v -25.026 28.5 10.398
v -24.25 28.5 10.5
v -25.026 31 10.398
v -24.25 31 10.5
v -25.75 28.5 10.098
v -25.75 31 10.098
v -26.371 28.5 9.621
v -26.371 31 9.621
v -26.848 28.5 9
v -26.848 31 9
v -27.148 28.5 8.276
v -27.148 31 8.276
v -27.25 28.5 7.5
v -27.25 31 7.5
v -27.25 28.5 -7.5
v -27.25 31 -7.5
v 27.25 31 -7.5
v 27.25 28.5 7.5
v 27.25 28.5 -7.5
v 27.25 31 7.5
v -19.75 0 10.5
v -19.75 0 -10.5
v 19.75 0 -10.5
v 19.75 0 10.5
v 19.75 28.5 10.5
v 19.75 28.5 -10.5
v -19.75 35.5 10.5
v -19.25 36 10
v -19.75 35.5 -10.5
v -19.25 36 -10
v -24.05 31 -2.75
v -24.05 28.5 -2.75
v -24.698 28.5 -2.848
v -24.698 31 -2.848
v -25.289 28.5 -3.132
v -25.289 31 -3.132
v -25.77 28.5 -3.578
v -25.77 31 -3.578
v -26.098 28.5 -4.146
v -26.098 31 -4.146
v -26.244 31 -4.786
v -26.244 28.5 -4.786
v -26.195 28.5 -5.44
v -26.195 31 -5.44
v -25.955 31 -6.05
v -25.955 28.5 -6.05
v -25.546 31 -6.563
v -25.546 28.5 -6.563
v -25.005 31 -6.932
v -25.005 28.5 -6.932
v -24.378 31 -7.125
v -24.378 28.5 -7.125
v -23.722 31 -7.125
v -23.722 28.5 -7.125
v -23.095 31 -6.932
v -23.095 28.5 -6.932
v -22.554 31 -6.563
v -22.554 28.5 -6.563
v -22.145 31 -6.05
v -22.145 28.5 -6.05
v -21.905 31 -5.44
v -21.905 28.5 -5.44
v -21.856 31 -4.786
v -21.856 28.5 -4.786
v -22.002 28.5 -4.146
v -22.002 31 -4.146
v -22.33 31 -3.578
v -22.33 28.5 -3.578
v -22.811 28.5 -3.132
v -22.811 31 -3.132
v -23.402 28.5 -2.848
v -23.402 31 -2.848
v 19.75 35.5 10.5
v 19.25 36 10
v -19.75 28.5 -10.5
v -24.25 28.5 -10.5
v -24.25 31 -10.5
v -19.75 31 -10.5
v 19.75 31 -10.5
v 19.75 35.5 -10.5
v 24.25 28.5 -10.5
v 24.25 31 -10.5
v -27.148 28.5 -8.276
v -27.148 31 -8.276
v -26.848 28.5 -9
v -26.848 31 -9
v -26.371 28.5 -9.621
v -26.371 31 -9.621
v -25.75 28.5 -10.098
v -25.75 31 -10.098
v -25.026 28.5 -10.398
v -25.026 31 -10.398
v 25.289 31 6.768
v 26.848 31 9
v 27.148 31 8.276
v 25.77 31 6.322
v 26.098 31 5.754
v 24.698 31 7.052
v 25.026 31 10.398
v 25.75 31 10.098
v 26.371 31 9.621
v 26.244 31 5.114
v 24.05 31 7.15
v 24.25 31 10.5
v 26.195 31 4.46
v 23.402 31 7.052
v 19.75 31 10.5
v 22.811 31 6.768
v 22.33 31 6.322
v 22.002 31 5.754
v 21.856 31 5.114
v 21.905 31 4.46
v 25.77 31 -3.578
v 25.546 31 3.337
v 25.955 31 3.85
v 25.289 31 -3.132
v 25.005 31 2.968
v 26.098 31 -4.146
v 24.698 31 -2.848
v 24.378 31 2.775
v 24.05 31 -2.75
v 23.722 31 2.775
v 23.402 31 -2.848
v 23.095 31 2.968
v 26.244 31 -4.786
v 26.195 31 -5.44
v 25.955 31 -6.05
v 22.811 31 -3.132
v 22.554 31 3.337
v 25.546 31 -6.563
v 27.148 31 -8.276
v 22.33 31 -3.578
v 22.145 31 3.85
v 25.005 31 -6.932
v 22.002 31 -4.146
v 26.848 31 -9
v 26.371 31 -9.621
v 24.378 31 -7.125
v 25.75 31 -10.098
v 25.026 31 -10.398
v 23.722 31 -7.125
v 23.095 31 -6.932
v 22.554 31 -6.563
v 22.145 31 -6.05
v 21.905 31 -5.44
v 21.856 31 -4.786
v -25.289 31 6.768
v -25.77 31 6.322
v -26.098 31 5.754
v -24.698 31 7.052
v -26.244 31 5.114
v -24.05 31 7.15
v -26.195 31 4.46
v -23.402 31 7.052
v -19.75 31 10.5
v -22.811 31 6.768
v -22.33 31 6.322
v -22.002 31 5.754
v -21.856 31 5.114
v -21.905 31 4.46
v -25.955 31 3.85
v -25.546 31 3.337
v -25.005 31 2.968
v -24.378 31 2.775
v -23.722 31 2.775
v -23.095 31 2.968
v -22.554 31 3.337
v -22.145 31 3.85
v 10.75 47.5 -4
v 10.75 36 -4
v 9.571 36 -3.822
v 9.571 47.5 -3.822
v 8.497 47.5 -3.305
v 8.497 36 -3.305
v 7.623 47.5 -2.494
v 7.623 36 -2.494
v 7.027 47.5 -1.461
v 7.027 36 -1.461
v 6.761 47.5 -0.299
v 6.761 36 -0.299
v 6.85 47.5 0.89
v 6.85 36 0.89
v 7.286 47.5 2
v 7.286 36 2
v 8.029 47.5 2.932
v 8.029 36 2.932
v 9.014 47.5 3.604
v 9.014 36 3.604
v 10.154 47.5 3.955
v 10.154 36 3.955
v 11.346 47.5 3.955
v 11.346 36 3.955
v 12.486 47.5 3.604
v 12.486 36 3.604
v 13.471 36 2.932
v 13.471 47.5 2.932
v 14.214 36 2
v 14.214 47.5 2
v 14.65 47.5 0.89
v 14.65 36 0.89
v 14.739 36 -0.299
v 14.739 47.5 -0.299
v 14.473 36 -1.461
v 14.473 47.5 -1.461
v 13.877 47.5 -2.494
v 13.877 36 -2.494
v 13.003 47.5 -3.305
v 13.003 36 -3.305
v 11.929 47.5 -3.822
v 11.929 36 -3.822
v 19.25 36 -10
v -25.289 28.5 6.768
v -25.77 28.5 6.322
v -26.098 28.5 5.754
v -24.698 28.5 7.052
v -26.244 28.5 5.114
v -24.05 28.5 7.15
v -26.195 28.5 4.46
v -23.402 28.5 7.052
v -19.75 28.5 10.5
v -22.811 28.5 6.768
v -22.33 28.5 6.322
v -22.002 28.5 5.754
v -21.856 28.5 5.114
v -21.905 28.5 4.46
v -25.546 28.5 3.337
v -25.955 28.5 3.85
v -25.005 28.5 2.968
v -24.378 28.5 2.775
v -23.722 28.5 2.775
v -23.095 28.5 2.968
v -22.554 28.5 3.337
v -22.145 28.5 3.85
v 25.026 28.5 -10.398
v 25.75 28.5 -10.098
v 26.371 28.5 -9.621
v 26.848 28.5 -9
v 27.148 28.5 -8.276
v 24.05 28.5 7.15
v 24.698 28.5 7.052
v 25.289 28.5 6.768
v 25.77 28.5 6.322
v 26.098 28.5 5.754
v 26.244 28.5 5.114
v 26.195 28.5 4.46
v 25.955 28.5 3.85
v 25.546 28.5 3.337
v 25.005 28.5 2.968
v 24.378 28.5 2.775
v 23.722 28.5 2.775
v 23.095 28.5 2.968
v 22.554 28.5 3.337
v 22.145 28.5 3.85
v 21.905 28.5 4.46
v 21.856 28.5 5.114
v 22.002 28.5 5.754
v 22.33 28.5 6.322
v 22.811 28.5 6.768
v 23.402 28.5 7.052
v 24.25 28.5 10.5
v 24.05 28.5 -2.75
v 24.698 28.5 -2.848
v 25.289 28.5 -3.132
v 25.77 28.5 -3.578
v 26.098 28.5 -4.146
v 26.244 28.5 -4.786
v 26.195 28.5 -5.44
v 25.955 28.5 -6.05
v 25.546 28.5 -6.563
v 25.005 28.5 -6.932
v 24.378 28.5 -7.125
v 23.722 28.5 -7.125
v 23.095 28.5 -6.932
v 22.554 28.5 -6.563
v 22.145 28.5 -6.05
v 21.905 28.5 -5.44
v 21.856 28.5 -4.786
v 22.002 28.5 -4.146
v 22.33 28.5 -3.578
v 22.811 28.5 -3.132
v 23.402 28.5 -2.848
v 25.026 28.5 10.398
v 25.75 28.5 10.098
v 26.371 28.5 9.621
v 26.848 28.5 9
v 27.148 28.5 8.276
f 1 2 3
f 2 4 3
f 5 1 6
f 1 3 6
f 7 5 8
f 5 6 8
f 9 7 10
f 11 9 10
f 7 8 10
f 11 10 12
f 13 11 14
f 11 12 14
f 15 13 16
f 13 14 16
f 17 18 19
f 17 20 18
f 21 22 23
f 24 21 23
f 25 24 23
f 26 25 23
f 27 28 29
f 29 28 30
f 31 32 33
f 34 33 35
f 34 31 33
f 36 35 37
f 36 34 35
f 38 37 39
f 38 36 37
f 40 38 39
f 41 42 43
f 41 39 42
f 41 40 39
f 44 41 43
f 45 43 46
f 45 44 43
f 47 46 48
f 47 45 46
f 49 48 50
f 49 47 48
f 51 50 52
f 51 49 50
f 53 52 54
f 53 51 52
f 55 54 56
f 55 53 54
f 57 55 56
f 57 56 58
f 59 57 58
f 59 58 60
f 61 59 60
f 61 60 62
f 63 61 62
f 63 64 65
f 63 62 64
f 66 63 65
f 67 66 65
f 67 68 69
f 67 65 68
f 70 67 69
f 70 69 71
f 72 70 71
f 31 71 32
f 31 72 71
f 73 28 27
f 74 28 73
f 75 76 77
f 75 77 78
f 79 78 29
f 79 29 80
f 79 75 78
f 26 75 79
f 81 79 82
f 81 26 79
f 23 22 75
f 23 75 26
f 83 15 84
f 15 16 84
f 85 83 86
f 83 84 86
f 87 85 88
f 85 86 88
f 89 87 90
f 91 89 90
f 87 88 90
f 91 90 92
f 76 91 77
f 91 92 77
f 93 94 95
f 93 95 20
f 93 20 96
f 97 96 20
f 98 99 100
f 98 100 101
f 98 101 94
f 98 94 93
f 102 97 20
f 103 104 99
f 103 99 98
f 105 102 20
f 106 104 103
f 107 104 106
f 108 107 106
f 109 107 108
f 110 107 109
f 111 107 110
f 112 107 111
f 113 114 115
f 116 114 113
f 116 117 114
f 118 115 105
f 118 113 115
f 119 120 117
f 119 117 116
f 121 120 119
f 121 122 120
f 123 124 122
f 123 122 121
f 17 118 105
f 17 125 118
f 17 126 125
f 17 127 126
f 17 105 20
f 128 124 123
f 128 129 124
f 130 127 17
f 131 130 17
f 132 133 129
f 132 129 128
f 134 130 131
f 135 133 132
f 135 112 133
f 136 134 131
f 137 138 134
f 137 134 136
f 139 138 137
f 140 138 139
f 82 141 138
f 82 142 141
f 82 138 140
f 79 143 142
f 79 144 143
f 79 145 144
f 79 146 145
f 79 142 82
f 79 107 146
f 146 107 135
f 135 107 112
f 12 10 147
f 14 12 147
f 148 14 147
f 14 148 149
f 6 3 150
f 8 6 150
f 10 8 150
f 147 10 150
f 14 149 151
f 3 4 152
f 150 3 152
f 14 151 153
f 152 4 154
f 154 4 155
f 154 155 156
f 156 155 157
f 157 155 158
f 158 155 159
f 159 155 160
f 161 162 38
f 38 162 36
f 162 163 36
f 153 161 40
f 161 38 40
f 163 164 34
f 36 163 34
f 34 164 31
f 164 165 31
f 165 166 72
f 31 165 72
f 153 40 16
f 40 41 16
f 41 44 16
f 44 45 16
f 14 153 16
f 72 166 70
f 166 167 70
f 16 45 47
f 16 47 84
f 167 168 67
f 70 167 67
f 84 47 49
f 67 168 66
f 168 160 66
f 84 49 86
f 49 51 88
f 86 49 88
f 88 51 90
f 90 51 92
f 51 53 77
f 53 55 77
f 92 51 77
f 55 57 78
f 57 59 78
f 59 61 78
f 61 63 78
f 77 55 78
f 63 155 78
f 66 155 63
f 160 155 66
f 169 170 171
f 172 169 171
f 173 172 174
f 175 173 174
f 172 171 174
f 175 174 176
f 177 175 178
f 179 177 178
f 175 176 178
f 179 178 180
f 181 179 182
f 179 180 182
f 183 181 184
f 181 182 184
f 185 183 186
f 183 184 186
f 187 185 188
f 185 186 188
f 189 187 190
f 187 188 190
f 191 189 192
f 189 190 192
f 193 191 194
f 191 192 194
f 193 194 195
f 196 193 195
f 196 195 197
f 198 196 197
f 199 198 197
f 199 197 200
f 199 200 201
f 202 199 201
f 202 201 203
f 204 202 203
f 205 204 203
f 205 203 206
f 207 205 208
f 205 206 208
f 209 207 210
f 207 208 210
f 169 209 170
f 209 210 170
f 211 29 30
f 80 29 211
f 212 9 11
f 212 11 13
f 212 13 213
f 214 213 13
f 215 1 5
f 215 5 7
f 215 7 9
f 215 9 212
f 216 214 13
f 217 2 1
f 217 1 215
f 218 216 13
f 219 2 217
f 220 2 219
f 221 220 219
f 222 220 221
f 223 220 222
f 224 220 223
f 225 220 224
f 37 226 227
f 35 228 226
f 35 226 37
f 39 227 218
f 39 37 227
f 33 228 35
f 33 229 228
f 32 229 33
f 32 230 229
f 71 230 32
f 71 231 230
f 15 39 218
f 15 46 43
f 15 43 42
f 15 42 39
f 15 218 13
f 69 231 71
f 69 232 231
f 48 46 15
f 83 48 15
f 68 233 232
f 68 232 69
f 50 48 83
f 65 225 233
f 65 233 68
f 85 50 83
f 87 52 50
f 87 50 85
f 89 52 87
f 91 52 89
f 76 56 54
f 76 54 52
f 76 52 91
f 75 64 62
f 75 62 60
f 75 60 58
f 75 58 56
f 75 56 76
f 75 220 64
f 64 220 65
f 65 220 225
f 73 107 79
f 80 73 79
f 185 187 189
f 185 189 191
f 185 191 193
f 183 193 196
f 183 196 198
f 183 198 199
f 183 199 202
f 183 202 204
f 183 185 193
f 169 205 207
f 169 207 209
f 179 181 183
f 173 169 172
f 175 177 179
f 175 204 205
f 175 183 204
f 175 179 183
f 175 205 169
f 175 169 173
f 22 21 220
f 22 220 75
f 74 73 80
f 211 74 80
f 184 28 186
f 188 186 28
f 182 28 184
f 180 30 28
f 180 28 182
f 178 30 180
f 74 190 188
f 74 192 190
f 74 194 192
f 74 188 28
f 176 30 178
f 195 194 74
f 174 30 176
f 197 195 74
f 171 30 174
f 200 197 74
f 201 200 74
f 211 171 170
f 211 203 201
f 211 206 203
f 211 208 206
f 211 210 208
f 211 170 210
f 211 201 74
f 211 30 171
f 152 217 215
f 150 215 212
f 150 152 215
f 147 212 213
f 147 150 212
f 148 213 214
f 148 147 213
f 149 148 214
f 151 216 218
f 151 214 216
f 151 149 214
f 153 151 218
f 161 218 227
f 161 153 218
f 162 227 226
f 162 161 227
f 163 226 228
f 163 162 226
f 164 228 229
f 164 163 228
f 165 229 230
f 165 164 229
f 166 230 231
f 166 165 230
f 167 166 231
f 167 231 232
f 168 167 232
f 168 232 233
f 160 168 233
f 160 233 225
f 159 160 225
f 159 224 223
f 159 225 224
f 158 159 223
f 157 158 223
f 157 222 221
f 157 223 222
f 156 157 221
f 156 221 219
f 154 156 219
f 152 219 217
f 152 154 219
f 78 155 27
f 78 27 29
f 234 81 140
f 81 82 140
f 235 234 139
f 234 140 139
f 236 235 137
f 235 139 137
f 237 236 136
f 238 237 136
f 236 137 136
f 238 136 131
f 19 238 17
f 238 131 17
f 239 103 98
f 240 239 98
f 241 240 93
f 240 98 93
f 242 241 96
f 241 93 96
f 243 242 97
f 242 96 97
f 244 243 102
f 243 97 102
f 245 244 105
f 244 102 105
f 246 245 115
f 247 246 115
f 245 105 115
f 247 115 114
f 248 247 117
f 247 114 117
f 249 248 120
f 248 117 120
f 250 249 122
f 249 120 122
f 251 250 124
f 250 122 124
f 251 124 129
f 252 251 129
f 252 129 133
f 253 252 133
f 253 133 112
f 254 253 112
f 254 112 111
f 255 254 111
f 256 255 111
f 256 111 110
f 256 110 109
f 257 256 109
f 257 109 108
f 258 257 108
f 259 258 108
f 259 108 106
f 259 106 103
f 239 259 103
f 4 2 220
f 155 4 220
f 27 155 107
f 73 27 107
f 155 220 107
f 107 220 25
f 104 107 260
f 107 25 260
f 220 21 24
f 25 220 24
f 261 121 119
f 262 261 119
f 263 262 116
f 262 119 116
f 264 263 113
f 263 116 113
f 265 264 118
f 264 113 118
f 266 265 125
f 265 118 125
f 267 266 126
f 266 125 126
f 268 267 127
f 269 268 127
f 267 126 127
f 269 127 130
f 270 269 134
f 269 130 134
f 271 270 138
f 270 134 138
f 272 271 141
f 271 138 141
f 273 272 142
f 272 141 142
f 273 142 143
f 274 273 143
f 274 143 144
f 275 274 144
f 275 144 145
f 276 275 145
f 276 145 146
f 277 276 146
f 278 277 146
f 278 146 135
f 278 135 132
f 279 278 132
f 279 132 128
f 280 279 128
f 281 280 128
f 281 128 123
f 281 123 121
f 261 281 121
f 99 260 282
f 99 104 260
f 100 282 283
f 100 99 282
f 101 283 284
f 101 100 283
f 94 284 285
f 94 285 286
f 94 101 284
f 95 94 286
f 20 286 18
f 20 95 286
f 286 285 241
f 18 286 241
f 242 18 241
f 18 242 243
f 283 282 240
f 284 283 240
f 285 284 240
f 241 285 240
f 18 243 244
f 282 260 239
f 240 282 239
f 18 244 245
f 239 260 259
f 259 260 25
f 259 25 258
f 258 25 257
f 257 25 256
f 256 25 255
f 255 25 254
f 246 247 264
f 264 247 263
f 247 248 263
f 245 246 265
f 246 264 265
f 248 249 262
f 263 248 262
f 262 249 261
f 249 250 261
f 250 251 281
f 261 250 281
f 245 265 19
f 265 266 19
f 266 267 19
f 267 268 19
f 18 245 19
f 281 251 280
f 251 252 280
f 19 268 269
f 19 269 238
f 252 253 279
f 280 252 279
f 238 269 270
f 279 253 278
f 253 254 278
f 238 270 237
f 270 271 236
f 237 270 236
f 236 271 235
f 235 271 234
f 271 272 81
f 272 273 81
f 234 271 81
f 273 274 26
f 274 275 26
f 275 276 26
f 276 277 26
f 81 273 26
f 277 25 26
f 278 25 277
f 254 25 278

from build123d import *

# Parameters (mm, degrees)
SKETCH1_W            = 39.5
SKETCH1_H            = 21
BOSS_EXTRUDE1_DEPTH  = 36
SKETCH2_R            = 4
BOSS_EXTRUDE2_DEPTH  = 11.5
SKETCH4_W            = 21
SKETCH4_H            = 2.5
BOSS_EXTRUDE4_DEPTH  = 7.5
SKETCH5_R            = 2.2
CUT_EXTRUDE1_DEPTH   = 7.5
FILLET1_R            = 3
FILLET1_OF_MIRROR1_R = 3
CHAMFER1_SIZE        = 0.5


with BuildPart() as part:
    # Sketch1 → Boss-Extrude1 (new body)
    with BuildSketch(Plane(origin=(0, 0, 0), x_dir=(1, 0, 0), z_dir=(0, 1, 0))):
        Rectangle(SKETCH1_W, SKETCH1_H)
    extrude(amount=BOSS_EXTRUDE1_DEPTH)

    # Sketch2 → Boss-Extrude2 (add)
    with BuildSketch(Plane(origin=(0, 36, 0), x_dir=(1, 0, 0), z_dir=(0, 1, 0))):
        with Locations(Location((10.75, 0, 0), (0, 0, 90))):
            Circle(SKETCH2_R)
    extrude(amount=BOSS_EXTRUDE2_DEPTH)

    # Sketch4 → Boss-Extrude4 (add)
    with BuildSketch(Plane(origin=(19.75, 0, 0), x_dir=(0, 0, -1), z_dir=(1, 0, 0))):
        with Locations((0, 29.75)):
            Rectangle(SKETCH4_W, SKETCH4_H)
    boss_extrude4 = extrude(amount=BOSS_EXTRUDE4_DEPTH)

    # Sketch5 → Cut-Extrude1 (cut)
    with BuildSketch(Plane(origin=(0, 31, 0), x_dir=(1, 0, 0), z_dir=(0, 1, 0))):
        with Locations(Location((24.05, 4.95, 0), (0, 0, 270))):
            Circle(SKETCH5_R)
        with Locations(Location((24.05, -4.95, 0), (0, 0, 270))):
            Circle(SKETCH5_R)
    cut_extrude1 = extrude(amount=-CUT_EXTRUDE1_DEPTH, mode=Mode.SUBTRACT)

    # Fillet1
    fillet1_edges = [part.edges().sort_by_distance(p)[0] for p in [
        (27.25, 29.75, 10.5),
        (27.25, 29.75, -10.5),
    ]]
    fillet(fillet1_edges, radius=FILLET1_R)

    # Mirror1: Boss-Extrude4, Cut-Extrude1 across plane
    add(boss_extrude4.mirror(Plane(origin=(0, 0, 0), x_dir=(0, 0, 1), z_dir=(1, 0, 0))))
    add(cut_extrude1.mirror(Plane(origin=(0, 0, 0), x_dir=(0, 0, 1), z_dir=(1, 0, 0))), mode=Mode.SUBTRACT)

    # Fillet1 of Mirror1
    fillet1_of_mirror1_edges = [part.edges().sort_by_distance(p)[0] for p in [
        (-27.25, 29.75, 10.5),
        (-27.25, 29.75, -10.5),
    ]]
    fillet(fillet1_of_mirror1_edges, radius=FILLET1_OF_MIRROR1_R)

    # Chamfer1
    chamfer1_edges = [part.edges().sort_by_distance(p)[0] for p in [
        (-19.75, 36, 0),
        (0, 36, 10.5),
        (19.75, 36, 0),
        (0, 36, -10.5),
    ]]
    chamfer(chamfer1_edges, length=CHAMFER1_SIZE)


solid = part.part
